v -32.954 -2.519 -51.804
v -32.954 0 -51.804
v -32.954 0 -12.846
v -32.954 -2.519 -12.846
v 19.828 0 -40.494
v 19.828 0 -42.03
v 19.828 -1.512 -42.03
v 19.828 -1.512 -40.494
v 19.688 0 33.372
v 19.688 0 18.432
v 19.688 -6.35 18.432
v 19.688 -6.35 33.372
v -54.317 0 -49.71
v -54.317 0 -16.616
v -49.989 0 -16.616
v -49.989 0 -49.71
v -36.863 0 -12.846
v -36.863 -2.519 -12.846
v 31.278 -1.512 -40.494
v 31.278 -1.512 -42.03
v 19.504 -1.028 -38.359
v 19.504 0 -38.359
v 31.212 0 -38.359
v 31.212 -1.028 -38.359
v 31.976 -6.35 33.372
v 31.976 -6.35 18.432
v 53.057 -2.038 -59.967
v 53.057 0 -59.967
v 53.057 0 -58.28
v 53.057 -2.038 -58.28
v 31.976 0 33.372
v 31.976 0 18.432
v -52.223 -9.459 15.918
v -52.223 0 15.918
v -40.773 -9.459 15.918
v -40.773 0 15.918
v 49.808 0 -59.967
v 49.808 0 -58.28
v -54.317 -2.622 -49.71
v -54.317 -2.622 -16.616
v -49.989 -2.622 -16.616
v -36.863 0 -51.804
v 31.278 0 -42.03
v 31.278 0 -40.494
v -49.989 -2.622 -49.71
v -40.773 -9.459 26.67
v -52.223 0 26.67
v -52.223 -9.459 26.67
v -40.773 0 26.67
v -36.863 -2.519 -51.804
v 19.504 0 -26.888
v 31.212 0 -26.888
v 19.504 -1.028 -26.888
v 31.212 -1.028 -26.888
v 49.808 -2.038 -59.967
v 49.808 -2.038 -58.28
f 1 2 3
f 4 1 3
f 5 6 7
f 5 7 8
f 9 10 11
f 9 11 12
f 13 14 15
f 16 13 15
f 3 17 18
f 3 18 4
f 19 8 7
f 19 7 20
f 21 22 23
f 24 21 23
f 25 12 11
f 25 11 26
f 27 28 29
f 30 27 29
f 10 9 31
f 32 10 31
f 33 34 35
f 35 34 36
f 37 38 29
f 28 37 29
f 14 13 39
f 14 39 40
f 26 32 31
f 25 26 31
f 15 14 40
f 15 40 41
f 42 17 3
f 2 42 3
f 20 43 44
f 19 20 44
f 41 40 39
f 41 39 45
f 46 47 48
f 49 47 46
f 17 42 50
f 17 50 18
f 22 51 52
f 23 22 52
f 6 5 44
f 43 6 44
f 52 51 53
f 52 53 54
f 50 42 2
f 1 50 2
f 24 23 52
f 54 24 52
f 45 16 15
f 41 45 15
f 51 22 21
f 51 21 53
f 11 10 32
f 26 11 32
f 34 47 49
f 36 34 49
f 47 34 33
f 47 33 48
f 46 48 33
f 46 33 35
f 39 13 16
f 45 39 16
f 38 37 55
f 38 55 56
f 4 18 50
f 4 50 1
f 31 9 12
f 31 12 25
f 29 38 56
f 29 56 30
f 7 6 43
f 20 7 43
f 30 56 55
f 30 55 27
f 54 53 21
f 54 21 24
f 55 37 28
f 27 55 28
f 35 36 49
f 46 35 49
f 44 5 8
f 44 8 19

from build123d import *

# Parameters (mm, degrees)
F0_W      = 4.3286383152
F0_H      = 33.0931413919
F1_DEPTH  = 2.6221
F2_W      = 3.9097368717
F2_H      = 38.9577494934
F3_DEPTH  = 2.51867
F4_W      = 12.2877489775
F4_H      = 14.9407852441
F5_DEPTH  = 6.35
F6_W      = 11.4499479532
F6_H      = 10.7517801225
F7_DEPTH  = 9.45878
F8_W      = 11.7086973041
F8_H      = 11.4714205265
F9_DEPTH  = 1.02785
F12_W     = 11.4499498159
F12_H     = 1.5359669924
F13_DEPTH = 1.51179
F14_W     = 3.2493509352
F14_H     = 1.6868524253
F15_DEPTH = 2.03765


# Not quite as in the source:
# - the program builds the solid bodies; features that only make, move or delete a surface that nothing else refers to are left out


with BuildPart() as f1:
    # F0 (on Front) → F1 (new body)
    with BuildSketch(Plane.XZ):
        with Locations((-52.1531142294, -33.1629579887)):
            Rectangle(F0_W, F0_H)
    extrude(amount=F1_DEPTH)


with BuildPart() as f3:
    # F2 (on Front) → F3 (new body)
    with BuildSketch(Plane.XZ):
        with Locations((-34.9083766341, -32.32515743)):
            Rectangle(F2_W, F2_H)
    extrude(amount=F3_DEPTH)


with BuildPart() as f5:
    # F4 (on Front) → F5 (new body)
    with BuildSketch(Plane.XZ):
        with Locations((25.8321994916, 25.9020170197)):
            Rectangle(F4_W, F4_H)
    extrude(amount=F5_DEPTH)


with BuildPart() as f7:
    # F6 (on Front) → F7 (new body)
    with BuildSketch(Plane.XZ):
        with Locations((-46.4979596436, 21.2941113859)):
            Rectangle(F6_W, F6_H)
    extrude(amount=F7_DEPTH)


with BuildPart() as f9:
    # F8 (on Front) → F9 (new body)
    with BuildSketch(Plane.XZ):
        with Locations((25.358104147, -32.6233431697)):
            Rectangle(F8_W, F8_H)
    extrude(amount=F9_DEPTH)


with BuildPart() as f13:
    # F12 (on Front) → F13 (new body)
    with BuildSketch(Plane.XZ):
        with Locations((25.552934967, -41.261702776)):
            Rectangle(F12_W, F12_H)
    extrude(amount=F13_DEPTH)


with BuildPart() as f15:
    # F14 (on Front) → F15 (new body)
    with BuildSketch(Plane.XZ):
        with Locations((51.4326412231, -59.1236930341)):
            Rectangle(F14_W, F14_H)
    extrude(amount=F15_DEPTH)


solid = Compound([f1.part, f3.part, f5.part, f7.part, f9.part, f13.part, f15.part])
